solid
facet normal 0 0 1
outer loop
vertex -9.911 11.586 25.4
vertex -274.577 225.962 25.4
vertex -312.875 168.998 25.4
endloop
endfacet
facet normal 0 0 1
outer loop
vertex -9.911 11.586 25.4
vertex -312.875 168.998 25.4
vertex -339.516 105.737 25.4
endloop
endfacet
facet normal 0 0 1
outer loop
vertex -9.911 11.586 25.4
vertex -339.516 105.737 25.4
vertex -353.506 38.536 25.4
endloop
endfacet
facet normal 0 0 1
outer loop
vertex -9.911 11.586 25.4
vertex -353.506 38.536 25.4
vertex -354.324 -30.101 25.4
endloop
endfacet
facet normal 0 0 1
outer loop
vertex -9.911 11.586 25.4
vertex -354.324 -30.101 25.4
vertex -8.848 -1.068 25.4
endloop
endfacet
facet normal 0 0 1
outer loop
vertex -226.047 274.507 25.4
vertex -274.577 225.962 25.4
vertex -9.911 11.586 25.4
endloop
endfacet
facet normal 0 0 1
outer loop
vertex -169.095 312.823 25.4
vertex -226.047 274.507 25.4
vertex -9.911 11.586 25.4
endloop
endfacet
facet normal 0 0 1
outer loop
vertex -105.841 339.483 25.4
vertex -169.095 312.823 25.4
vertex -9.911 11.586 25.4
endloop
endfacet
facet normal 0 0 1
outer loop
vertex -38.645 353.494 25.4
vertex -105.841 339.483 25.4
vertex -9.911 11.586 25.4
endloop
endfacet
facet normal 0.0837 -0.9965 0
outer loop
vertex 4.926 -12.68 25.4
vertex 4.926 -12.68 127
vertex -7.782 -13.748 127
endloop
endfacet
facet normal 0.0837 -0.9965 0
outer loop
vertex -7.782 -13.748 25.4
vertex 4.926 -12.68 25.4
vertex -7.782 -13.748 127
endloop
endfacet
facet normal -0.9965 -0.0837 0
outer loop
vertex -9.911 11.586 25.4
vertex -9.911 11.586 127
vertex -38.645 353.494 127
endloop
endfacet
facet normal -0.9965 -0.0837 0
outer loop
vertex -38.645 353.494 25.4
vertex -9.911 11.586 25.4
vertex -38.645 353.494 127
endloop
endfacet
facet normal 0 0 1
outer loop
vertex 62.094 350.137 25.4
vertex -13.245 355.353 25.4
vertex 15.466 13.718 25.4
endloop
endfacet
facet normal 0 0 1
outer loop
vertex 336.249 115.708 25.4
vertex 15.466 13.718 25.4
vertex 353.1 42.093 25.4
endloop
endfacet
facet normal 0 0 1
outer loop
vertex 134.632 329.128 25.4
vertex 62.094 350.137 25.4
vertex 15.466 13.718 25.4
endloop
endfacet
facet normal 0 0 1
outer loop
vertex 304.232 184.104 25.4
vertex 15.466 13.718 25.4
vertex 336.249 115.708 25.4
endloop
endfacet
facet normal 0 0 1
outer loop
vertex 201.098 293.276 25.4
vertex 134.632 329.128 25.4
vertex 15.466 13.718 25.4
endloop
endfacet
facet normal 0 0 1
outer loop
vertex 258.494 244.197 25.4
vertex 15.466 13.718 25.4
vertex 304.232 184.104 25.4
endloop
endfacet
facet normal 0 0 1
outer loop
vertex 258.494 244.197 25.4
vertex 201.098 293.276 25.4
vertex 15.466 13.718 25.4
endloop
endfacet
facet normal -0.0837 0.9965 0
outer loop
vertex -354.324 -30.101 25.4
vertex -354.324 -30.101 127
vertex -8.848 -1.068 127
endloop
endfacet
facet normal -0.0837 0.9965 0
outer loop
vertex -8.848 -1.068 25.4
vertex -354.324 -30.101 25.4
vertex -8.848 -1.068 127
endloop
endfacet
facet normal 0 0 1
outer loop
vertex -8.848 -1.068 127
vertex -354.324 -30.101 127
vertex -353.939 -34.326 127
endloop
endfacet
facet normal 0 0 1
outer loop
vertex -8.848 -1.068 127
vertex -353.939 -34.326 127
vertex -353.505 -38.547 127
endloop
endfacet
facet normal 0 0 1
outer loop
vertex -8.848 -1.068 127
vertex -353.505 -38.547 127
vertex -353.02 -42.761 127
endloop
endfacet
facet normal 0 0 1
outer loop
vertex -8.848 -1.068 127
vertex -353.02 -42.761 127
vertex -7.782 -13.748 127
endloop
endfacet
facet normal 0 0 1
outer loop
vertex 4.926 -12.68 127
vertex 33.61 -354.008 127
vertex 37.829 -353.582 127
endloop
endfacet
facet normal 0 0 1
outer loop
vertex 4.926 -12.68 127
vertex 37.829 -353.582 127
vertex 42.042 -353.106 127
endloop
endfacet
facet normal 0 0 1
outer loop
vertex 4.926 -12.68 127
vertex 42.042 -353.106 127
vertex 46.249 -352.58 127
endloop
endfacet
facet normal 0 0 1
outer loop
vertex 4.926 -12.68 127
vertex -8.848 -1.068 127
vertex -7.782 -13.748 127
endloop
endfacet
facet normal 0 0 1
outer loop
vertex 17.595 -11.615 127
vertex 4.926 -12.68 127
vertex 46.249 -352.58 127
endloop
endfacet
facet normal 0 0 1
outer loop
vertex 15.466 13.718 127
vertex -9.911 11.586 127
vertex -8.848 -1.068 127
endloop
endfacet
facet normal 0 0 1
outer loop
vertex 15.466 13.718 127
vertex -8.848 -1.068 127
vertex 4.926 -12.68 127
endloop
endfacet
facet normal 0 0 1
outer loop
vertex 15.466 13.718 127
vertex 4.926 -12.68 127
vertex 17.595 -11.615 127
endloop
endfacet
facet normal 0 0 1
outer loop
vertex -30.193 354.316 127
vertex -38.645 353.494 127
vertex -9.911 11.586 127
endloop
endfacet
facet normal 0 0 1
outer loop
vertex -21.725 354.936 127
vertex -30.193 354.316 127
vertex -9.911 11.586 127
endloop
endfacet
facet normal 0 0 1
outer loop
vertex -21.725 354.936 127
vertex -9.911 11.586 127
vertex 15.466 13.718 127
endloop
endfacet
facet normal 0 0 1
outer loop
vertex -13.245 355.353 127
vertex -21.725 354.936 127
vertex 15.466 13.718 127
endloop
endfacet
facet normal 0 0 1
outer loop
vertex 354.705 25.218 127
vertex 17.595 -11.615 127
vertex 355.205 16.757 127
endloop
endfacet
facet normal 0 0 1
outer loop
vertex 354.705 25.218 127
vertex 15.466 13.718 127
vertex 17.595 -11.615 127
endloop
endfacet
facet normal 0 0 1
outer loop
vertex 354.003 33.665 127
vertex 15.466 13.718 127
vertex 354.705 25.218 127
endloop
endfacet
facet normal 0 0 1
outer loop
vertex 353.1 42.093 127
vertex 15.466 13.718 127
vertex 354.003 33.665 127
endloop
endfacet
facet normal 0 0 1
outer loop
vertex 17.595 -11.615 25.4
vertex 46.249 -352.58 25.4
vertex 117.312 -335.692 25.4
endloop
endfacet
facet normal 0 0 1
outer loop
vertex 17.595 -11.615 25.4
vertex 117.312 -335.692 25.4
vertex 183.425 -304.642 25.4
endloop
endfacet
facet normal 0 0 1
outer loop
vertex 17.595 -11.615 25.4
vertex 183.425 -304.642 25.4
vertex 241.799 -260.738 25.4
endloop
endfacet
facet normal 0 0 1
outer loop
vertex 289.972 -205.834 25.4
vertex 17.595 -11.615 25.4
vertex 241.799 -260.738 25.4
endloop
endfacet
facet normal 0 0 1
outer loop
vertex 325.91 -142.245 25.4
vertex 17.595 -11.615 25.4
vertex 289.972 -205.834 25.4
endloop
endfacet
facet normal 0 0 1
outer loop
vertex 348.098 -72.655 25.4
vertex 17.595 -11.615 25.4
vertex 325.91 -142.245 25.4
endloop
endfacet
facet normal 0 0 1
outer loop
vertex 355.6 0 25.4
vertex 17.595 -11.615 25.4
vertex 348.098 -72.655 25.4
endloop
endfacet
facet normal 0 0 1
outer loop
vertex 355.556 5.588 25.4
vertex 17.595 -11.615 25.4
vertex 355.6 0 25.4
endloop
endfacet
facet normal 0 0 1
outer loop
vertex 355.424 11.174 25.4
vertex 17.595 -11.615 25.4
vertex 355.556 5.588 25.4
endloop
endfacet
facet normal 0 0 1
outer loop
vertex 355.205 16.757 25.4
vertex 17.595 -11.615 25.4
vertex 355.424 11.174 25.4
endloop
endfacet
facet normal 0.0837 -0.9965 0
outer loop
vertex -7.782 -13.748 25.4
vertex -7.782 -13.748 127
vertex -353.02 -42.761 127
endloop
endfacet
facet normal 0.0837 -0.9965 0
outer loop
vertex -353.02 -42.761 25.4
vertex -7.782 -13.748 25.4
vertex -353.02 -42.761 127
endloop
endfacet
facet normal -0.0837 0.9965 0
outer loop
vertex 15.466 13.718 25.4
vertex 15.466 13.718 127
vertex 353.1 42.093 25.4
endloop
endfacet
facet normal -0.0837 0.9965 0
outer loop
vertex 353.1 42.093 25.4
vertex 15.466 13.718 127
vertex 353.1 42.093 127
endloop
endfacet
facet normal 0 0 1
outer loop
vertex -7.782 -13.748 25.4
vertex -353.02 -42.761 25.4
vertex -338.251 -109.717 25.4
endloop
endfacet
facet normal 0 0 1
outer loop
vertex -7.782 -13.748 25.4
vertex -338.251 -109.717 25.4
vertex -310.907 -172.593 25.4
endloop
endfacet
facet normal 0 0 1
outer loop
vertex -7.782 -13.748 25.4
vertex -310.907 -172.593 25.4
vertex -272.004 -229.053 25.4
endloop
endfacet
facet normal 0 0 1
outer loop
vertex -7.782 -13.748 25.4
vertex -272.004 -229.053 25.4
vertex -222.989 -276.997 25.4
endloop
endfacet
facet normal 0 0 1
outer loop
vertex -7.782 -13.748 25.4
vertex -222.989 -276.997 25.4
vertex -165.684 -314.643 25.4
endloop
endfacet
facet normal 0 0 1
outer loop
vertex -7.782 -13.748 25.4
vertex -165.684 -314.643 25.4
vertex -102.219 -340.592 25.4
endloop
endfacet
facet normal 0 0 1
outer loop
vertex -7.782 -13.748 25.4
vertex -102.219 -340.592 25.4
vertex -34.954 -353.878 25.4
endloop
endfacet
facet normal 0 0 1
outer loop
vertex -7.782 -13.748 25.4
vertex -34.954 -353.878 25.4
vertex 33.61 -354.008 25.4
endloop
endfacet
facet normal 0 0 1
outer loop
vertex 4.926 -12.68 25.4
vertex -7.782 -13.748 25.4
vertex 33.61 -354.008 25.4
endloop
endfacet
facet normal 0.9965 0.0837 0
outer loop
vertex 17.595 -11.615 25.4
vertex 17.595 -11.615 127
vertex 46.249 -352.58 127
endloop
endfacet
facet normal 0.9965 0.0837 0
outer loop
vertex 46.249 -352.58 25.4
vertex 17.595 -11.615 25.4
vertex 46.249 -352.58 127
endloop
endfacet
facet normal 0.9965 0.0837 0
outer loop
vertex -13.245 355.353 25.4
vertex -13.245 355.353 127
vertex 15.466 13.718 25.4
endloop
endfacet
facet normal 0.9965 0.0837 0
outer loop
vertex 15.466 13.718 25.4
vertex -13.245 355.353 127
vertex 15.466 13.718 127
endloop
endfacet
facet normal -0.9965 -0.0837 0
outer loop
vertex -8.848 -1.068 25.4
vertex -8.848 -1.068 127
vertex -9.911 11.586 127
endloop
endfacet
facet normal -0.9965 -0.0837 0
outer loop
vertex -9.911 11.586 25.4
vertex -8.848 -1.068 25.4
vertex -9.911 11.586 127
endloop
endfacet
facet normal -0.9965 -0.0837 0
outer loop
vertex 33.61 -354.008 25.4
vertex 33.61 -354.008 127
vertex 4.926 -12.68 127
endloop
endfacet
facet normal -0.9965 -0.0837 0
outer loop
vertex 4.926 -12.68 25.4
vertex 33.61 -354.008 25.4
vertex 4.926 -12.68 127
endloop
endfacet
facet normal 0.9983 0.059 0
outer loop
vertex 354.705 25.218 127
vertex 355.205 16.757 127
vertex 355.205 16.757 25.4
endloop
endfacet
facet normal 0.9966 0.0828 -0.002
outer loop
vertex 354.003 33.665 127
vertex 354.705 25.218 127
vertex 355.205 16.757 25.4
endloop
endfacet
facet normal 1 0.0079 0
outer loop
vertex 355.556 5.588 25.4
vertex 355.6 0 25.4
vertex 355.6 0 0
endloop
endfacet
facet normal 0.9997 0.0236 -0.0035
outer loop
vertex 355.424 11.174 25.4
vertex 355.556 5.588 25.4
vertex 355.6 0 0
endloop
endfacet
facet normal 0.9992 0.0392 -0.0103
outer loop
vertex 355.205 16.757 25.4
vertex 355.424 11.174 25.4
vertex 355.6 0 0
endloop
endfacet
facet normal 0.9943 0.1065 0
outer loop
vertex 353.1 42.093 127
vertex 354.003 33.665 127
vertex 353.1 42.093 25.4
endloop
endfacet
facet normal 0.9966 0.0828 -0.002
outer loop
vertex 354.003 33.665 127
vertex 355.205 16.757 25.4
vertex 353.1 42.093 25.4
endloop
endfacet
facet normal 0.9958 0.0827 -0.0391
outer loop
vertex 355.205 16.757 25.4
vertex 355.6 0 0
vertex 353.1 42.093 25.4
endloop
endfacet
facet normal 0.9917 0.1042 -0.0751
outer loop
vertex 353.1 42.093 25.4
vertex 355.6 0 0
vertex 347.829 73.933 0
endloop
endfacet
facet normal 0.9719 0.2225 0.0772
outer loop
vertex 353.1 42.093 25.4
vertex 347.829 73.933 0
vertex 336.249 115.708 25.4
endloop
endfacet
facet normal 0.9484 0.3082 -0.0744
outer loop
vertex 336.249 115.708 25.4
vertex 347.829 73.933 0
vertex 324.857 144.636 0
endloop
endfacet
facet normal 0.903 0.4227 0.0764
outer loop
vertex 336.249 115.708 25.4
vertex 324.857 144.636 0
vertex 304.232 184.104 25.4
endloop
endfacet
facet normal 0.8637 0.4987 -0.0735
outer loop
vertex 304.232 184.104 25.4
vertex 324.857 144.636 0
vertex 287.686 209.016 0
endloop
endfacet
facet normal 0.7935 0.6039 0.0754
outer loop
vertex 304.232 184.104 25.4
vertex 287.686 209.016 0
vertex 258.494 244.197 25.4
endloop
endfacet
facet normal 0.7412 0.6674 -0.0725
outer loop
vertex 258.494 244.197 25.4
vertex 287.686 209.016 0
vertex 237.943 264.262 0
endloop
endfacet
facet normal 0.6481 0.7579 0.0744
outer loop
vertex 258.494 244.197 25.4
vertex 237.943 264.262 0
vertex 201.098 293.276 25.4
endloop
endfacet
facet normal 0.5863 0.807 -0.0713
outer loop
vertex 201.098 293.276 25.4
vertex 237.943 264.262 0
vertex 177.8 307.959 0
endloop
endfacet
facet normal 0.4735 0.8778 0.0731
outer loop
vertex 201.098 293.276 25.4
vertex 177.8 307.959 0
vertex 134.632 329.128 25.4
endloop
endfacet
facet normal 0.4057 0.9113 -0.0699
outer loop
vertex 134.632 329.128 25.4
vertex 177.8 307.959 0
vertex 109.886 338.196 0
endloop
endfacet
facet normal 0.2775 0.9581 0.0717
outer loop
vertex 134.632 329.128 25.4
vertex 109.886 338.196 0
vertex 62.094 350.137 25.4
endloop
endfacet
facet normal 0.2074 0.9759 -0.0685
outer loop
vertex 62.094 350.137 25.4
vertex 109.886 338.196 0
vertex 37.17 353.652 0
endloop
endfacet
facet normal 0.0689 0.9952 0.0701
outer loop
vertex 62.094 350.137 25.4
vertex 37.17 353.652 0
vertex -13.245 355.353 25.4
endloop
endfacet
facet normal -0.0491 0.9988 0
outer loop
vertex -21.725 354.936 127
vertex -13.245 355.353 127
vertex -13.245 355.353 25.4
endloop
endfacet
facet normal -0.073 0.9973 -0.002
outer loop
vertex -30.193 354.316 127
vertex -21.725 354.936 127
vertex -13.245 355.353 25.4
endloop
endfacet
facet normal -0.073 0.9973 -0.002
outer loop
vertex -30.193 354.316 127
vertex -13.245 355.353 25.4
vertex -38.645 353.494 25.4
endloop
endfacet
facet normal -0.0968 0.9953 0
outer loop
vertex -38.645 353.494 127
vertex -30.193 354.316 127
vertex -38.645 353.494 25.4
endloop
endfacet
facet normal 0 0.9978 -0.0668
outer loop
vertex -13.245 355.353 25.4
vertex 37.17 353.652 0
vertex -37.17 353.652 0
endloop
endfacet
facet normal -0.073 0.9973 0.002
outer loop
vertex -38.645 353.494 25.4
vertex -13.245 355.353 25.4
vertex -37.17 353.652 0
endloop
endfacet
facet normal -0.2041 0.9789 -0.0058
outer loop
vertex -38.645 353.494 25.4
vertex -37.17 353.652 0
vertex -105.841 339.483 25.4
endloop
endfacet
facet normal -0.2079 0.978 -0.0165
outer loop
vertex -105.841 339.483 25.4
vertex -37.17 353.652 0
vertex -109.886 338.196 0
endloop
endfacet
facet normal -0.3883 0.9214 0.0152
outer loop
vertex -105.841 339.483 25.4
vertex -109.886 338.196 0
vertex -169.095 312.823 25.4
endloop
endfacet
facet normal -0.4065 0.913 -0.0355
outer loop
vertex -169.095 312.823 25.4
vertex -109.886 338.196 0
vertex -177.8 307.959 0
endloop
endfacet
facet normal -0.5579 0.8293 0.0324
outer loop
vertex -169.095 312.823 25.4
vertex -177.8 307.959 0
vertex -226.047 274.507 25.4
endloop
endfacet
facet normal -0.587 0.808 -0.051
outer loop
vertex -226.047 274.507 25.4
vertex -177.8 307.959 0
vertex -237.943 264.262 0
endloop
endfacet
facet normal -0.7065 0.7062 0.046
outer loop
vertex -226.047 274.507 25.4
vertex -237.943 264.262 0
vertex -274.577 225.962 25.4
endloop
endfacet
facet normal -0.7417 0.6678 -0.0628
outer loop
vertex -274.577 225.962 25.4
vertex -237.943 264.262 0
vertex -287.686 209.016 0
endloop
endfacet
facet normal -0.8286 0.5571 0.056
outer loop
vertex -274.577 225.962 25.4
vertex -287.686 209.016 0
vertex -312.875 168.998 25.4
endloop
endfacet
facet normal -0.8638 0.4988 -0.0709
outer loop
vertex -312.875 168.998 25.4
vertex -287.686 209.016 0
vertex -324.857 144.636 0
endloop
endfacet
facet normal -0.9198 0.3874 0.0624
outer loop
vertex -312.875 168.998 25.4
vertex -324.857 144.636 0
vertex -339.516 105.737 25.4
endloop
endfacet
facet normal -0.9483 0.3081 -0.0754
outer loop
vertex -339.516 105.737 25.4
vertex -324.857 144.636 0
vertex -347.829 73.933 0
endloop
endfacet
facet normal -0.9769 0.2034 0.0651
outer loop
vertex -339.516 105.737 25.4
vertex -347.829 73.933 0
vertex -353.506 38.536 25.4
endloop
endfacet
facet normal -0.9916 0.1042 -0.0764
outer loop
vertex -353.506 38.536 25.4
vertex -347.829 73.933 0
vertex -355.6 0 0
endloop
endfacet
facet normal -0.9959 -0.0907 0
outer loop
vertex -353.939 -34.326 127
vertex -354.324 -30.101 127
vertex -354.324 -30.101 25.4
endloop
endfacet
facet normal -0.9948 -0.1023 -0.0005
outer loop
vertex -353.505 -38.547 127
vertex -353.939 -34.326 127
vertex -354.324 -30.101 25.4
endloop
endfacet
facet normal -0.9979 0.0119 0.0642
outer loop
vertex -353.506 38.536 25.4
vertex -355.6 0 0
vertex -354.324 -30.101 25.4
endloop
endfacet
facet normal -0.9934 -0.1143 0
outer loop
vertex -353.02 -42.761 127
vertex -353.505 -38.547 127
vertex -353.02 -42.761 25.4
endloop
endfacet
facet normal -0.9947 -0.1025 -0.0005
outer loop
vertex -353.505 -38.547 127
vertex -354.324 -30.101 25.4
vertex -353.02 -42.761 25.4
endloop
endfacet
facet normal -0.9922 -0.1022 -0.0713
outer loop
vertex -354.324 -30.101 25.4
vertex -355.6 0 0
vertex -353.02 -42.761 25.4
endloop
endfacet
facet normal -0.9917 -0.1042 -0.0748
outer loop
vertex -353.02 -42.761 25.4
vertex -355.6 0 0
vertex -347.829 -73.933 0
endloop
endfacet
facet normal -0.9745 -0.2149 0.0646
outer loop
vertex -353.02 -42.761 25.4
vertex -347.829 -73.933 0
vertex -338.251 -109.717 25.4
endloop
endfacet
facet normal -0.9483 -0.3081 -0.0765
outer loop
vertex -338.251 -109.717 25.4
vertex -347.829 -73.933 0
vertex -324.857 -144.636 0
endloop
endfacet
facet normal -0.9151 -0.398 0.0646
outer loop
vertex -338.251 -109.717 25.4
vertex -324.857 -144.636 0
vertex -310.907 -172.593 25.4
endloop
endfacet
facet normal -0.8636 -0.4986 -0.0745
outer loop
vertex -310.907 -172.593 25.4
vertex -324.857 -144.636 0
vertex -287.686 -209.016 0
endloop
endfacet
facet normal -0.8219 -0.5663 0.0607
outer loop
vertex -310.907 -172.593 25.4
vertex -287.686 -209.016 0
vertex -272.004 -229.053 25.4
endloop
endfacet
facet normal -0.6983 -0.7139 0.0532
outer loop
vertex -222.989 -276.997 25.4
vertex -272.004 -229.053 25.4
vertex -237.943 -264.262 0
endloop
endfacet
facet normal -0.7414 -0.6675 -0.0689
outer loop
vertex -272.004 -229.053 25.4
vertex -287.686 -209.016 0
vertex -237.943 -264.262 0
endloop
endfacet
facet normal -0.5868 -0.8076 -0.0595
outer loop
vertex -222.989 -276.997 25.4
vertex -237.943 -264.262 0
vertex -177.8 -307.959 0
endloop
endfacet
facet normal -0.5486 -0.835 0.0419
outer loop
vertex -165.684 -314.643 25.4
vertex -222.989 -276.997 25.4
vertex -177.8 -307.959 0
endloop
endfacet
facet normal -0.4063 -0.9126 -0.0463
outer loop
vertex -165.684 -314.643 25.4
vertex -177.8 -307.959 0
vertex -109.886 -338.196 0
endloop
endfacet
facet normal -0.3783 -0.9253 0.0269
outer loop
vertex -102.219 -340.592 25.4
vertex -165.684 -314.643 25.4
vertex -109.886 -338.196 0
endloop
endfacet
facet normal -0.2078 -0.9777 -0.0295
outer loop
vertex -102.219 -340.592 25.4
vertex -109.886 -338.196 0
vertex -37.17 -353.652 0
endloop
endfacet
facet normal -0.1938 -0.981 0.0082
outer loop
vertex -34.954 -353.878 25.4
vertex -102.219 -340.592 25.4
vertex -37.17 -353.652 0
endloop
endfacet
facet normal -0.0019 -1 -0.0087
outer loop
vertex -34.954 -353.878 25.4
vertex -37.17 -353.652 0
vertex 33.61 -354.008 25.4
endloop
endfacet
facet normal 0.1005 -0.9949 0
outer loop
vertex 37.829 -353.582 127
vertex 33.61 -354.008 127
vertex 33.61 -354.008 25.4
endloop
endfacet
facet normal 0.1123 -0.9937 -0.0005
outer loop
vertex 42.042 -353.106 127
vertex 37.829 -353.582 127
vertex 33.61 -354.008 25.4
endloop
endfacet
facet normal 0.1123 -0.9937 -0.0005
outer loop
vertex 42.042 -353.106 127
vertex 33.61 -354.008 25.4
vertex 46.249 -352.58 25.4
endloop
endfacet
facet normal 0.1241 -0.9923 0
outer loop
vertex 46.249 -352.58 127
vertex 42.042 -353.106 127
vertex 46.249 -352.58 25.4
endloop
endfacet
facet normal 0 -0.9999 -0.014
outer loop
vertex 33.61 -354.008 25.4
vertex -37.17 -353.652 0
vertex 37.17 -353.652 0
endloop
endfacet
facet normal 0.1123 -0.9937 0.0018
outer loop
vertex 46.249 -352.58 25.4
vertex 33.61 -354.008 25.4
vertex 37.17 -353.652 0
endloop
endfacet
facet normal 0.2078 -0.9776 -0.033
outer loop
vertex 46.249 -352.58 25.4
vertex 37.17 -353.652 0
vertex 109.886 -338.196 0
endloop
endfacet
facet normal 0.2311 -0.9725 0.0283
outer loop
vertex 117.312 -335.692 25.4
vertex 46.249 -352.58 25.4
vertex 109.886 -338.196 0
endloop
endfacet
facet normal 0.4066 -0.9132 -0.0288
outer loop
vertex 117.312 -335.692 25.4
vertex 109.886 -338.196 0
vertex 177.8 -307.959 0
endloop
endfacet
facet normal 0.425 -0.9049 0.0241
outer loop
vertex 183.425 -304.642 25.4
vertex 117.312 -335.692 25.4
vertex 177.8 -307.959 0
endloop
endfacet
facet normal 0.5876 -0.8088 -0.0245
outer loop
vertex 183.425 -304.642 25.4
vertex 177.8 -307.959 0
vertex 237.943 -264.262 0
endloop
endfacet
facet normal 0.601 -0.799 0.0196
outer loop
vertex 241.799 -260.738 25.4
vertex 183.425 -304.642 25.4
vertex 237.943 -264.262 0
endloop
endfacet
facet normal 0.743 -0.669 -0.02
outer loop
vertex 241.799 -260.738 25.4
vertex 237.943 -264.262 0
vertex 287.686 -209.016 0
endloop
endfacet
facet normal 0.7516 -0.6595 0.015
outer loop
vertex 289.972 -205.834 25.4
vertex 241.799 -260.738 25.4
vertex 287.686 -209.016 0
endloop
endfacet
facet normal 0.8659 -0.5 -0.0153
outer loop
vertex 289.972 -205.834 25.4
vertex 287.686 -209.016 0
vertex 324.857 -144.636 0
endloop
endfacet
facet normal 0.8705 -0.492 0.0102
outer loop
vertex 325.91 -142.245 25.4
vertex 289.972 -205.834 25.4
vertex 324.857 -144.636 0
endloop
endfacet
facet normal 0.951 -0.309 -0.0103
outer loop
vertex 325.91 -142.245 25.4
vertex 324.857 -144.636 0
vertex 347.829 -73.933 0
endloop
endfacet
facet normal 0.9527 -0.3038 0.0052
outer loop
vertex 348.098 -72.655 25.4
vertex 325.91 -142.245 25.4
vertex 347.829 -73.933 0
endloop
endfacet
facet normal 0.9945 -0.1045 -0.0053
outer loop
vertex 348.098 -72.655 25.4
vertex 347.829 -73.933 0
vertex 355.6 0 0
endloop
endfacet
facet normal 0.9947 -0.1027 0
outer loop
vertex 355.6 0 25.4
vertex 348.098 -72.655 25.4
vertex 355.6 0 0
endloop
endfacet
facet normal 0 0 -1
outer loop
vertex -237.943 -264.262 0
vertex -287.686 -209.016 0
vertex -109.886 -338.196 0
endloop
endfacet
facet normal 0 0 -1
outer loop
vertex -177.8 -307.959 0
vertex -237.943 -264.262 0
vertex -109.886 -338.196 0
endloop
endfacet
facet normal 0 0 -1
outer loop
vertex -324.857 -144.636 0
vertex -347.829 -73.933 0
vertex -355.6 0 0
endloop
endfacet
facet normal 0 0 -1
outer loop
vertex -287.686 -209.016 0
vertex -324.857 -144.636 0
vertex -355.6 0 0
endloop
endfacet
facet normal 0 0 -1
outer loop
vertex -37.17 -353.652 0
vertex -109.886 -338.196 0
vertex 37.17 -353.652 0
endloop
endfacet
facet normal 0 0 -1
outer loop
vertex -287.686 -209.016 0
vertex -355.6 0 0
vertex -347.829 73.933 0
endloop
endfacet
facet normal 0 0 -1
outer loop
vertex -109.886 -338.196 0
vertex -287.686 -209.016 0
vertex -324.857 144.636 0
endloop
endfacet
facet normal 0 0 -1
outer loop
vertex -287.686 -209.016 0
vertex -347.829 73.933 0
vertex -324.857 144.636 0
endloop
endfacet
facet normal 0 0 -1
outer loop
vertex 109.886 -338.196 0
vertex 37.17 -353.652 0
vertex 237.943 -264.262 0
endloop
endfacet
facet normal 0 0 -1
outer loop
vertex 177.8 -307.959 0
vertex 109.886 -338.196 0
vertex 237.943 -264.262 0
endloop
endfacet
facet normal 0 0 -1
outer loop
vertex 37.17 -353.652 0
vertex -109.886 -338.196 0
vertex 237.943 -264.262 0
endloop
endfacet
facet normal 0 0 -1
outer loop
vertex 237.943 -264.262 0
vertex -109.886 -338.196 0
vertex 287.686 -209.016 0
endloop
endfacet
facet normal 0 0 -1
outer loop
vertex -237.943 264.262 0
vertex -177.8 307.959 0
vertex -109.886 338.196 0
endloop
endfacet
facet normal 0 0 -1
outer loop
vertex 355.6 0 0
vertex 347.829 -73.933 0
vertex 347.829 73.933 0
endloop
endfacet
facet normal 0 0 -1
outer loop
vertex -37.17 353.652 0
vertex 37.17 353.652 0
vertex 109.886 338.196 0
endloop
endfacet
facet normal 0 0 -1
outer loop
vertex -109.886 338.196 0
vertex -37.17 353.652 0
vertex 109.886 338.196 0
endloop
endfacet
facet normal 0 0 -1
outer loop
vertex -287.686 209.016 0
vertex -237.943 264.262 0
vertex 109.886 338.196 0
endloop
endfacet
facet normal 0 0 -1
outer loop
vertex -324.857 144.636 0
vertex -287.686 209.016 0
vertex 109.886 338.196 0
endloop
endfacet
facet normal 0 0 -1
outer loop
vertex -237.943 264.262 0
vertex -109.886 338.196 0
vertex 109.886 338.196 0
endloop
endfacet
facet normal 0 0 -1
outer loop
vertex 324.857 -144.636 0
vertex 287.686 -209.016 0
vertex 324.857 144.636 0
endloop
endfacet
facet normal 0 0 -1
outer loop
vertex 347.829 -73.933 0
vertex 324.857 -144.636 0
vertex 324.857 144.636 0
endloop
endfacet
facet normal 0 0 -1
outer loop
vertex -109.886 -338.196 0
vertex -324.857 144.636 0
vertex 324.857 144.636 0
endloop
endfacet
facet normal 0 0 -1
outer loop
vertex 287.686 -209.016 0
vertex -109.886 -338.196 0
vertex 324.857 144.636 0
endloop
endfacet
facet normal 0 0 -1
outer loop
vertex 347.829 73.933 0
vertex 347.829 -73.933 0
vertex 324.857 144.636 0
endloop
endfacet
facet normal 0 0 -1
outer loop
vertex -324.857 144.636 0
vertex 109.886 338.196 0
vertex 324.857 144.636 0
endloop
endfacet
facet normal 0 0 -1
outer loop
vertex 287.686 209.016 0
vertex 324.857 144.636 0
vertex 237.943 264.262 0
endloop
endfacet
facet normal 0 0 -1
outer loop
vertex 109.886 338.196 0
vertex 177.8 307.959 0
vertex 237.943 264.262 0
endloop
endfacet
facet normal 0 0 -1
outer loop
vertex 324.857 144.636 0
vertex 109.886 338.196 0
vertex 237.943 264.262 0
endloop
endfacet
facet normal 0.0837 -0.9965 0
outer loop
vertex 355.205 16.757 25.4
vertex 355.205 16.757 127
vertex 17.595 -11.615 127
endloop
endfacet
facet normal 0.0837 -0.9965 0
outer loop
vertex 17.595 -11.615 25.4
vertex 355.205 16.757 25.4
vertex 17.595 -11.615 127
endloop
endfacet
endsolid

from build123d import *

# Parameters (mm, degrees)
F0_R     = 355.6
F1_DEPTH = 127
F3_DEPTH = 101.6


with BuildPart() as f1:
    # F0 (on Top) → F1 (new body)
    with BuildSketch(Plane.XY):
        Circle(F0_R)
    extrude(amount=F1_DEPTH)

    # F2 (on face) → F3 (cut)
    with BuildSketch(Plane.XY.offset(127)):
        with BuildLine():
            ThreePointArc((353.0999389591, 42.0926728434), (231.1027319808, 270.2644765244), (-13.2445388494, 355.353263937))
            Line((-13.2445388494, 355.353263937), (15.4660869459, 13.7182963842))
            Line((15.4660869459, 13.7182963842), (353.0999389591, 42.0926728434))
        make_face()
        with BuildLine():
            Line((-9.9109431068, 11.5856387734), (-38.6445388494, 353.4939315139))
            ThreePointArc((-38.6445388494, 353.4939315139), (-274.5766604834, 225.962425013), (-354.3236766316, -30.1013650562))
            Line((-354.3236766316, -30.1013650562), (-8.8475509302, -1.0679325675))
            Line((-8.8475509302, -1.0679325675), (-9.9109431068, 11.5856387734))
        make_face()
        with BuildLine():
            Line((33.6104931009, -354.0080433458), (4.9256574214, -12.679958877))
            Line((4.9256574214, -12.679958877), (-7.7819411742, -13.7478914444))
            Line((-7.7819411742, -13.7478914444), (-353.0195925051, -42.7612828101))
            ThreePointArc((-353.0195925051, -42.7612828101), (-222.9891918492, -276.9967153568), (33.6104931009, -354.0080433458))
        make_face()
        with BuildLine():
            Line((355.2049530963, 16.7571267176), (17.5950888785, -11.6152338337))
            Line((17.5950888785, -11.6152338337), (46.2493560151, -352.5795755119))
            ThreePointArc((46.2493560152, -352.5795755119), (267.2991124181, -234.5262128217), (355.6, 0))
            ThreePointArc((355.6, 0), (355.5012245556, 8.3808913292), (355.2049530963, 16.7571267176))
        make_face()
    extrude(amount=-F3_DEPTH, mode=Mode.SUBTRACT)


solid = f1.part
